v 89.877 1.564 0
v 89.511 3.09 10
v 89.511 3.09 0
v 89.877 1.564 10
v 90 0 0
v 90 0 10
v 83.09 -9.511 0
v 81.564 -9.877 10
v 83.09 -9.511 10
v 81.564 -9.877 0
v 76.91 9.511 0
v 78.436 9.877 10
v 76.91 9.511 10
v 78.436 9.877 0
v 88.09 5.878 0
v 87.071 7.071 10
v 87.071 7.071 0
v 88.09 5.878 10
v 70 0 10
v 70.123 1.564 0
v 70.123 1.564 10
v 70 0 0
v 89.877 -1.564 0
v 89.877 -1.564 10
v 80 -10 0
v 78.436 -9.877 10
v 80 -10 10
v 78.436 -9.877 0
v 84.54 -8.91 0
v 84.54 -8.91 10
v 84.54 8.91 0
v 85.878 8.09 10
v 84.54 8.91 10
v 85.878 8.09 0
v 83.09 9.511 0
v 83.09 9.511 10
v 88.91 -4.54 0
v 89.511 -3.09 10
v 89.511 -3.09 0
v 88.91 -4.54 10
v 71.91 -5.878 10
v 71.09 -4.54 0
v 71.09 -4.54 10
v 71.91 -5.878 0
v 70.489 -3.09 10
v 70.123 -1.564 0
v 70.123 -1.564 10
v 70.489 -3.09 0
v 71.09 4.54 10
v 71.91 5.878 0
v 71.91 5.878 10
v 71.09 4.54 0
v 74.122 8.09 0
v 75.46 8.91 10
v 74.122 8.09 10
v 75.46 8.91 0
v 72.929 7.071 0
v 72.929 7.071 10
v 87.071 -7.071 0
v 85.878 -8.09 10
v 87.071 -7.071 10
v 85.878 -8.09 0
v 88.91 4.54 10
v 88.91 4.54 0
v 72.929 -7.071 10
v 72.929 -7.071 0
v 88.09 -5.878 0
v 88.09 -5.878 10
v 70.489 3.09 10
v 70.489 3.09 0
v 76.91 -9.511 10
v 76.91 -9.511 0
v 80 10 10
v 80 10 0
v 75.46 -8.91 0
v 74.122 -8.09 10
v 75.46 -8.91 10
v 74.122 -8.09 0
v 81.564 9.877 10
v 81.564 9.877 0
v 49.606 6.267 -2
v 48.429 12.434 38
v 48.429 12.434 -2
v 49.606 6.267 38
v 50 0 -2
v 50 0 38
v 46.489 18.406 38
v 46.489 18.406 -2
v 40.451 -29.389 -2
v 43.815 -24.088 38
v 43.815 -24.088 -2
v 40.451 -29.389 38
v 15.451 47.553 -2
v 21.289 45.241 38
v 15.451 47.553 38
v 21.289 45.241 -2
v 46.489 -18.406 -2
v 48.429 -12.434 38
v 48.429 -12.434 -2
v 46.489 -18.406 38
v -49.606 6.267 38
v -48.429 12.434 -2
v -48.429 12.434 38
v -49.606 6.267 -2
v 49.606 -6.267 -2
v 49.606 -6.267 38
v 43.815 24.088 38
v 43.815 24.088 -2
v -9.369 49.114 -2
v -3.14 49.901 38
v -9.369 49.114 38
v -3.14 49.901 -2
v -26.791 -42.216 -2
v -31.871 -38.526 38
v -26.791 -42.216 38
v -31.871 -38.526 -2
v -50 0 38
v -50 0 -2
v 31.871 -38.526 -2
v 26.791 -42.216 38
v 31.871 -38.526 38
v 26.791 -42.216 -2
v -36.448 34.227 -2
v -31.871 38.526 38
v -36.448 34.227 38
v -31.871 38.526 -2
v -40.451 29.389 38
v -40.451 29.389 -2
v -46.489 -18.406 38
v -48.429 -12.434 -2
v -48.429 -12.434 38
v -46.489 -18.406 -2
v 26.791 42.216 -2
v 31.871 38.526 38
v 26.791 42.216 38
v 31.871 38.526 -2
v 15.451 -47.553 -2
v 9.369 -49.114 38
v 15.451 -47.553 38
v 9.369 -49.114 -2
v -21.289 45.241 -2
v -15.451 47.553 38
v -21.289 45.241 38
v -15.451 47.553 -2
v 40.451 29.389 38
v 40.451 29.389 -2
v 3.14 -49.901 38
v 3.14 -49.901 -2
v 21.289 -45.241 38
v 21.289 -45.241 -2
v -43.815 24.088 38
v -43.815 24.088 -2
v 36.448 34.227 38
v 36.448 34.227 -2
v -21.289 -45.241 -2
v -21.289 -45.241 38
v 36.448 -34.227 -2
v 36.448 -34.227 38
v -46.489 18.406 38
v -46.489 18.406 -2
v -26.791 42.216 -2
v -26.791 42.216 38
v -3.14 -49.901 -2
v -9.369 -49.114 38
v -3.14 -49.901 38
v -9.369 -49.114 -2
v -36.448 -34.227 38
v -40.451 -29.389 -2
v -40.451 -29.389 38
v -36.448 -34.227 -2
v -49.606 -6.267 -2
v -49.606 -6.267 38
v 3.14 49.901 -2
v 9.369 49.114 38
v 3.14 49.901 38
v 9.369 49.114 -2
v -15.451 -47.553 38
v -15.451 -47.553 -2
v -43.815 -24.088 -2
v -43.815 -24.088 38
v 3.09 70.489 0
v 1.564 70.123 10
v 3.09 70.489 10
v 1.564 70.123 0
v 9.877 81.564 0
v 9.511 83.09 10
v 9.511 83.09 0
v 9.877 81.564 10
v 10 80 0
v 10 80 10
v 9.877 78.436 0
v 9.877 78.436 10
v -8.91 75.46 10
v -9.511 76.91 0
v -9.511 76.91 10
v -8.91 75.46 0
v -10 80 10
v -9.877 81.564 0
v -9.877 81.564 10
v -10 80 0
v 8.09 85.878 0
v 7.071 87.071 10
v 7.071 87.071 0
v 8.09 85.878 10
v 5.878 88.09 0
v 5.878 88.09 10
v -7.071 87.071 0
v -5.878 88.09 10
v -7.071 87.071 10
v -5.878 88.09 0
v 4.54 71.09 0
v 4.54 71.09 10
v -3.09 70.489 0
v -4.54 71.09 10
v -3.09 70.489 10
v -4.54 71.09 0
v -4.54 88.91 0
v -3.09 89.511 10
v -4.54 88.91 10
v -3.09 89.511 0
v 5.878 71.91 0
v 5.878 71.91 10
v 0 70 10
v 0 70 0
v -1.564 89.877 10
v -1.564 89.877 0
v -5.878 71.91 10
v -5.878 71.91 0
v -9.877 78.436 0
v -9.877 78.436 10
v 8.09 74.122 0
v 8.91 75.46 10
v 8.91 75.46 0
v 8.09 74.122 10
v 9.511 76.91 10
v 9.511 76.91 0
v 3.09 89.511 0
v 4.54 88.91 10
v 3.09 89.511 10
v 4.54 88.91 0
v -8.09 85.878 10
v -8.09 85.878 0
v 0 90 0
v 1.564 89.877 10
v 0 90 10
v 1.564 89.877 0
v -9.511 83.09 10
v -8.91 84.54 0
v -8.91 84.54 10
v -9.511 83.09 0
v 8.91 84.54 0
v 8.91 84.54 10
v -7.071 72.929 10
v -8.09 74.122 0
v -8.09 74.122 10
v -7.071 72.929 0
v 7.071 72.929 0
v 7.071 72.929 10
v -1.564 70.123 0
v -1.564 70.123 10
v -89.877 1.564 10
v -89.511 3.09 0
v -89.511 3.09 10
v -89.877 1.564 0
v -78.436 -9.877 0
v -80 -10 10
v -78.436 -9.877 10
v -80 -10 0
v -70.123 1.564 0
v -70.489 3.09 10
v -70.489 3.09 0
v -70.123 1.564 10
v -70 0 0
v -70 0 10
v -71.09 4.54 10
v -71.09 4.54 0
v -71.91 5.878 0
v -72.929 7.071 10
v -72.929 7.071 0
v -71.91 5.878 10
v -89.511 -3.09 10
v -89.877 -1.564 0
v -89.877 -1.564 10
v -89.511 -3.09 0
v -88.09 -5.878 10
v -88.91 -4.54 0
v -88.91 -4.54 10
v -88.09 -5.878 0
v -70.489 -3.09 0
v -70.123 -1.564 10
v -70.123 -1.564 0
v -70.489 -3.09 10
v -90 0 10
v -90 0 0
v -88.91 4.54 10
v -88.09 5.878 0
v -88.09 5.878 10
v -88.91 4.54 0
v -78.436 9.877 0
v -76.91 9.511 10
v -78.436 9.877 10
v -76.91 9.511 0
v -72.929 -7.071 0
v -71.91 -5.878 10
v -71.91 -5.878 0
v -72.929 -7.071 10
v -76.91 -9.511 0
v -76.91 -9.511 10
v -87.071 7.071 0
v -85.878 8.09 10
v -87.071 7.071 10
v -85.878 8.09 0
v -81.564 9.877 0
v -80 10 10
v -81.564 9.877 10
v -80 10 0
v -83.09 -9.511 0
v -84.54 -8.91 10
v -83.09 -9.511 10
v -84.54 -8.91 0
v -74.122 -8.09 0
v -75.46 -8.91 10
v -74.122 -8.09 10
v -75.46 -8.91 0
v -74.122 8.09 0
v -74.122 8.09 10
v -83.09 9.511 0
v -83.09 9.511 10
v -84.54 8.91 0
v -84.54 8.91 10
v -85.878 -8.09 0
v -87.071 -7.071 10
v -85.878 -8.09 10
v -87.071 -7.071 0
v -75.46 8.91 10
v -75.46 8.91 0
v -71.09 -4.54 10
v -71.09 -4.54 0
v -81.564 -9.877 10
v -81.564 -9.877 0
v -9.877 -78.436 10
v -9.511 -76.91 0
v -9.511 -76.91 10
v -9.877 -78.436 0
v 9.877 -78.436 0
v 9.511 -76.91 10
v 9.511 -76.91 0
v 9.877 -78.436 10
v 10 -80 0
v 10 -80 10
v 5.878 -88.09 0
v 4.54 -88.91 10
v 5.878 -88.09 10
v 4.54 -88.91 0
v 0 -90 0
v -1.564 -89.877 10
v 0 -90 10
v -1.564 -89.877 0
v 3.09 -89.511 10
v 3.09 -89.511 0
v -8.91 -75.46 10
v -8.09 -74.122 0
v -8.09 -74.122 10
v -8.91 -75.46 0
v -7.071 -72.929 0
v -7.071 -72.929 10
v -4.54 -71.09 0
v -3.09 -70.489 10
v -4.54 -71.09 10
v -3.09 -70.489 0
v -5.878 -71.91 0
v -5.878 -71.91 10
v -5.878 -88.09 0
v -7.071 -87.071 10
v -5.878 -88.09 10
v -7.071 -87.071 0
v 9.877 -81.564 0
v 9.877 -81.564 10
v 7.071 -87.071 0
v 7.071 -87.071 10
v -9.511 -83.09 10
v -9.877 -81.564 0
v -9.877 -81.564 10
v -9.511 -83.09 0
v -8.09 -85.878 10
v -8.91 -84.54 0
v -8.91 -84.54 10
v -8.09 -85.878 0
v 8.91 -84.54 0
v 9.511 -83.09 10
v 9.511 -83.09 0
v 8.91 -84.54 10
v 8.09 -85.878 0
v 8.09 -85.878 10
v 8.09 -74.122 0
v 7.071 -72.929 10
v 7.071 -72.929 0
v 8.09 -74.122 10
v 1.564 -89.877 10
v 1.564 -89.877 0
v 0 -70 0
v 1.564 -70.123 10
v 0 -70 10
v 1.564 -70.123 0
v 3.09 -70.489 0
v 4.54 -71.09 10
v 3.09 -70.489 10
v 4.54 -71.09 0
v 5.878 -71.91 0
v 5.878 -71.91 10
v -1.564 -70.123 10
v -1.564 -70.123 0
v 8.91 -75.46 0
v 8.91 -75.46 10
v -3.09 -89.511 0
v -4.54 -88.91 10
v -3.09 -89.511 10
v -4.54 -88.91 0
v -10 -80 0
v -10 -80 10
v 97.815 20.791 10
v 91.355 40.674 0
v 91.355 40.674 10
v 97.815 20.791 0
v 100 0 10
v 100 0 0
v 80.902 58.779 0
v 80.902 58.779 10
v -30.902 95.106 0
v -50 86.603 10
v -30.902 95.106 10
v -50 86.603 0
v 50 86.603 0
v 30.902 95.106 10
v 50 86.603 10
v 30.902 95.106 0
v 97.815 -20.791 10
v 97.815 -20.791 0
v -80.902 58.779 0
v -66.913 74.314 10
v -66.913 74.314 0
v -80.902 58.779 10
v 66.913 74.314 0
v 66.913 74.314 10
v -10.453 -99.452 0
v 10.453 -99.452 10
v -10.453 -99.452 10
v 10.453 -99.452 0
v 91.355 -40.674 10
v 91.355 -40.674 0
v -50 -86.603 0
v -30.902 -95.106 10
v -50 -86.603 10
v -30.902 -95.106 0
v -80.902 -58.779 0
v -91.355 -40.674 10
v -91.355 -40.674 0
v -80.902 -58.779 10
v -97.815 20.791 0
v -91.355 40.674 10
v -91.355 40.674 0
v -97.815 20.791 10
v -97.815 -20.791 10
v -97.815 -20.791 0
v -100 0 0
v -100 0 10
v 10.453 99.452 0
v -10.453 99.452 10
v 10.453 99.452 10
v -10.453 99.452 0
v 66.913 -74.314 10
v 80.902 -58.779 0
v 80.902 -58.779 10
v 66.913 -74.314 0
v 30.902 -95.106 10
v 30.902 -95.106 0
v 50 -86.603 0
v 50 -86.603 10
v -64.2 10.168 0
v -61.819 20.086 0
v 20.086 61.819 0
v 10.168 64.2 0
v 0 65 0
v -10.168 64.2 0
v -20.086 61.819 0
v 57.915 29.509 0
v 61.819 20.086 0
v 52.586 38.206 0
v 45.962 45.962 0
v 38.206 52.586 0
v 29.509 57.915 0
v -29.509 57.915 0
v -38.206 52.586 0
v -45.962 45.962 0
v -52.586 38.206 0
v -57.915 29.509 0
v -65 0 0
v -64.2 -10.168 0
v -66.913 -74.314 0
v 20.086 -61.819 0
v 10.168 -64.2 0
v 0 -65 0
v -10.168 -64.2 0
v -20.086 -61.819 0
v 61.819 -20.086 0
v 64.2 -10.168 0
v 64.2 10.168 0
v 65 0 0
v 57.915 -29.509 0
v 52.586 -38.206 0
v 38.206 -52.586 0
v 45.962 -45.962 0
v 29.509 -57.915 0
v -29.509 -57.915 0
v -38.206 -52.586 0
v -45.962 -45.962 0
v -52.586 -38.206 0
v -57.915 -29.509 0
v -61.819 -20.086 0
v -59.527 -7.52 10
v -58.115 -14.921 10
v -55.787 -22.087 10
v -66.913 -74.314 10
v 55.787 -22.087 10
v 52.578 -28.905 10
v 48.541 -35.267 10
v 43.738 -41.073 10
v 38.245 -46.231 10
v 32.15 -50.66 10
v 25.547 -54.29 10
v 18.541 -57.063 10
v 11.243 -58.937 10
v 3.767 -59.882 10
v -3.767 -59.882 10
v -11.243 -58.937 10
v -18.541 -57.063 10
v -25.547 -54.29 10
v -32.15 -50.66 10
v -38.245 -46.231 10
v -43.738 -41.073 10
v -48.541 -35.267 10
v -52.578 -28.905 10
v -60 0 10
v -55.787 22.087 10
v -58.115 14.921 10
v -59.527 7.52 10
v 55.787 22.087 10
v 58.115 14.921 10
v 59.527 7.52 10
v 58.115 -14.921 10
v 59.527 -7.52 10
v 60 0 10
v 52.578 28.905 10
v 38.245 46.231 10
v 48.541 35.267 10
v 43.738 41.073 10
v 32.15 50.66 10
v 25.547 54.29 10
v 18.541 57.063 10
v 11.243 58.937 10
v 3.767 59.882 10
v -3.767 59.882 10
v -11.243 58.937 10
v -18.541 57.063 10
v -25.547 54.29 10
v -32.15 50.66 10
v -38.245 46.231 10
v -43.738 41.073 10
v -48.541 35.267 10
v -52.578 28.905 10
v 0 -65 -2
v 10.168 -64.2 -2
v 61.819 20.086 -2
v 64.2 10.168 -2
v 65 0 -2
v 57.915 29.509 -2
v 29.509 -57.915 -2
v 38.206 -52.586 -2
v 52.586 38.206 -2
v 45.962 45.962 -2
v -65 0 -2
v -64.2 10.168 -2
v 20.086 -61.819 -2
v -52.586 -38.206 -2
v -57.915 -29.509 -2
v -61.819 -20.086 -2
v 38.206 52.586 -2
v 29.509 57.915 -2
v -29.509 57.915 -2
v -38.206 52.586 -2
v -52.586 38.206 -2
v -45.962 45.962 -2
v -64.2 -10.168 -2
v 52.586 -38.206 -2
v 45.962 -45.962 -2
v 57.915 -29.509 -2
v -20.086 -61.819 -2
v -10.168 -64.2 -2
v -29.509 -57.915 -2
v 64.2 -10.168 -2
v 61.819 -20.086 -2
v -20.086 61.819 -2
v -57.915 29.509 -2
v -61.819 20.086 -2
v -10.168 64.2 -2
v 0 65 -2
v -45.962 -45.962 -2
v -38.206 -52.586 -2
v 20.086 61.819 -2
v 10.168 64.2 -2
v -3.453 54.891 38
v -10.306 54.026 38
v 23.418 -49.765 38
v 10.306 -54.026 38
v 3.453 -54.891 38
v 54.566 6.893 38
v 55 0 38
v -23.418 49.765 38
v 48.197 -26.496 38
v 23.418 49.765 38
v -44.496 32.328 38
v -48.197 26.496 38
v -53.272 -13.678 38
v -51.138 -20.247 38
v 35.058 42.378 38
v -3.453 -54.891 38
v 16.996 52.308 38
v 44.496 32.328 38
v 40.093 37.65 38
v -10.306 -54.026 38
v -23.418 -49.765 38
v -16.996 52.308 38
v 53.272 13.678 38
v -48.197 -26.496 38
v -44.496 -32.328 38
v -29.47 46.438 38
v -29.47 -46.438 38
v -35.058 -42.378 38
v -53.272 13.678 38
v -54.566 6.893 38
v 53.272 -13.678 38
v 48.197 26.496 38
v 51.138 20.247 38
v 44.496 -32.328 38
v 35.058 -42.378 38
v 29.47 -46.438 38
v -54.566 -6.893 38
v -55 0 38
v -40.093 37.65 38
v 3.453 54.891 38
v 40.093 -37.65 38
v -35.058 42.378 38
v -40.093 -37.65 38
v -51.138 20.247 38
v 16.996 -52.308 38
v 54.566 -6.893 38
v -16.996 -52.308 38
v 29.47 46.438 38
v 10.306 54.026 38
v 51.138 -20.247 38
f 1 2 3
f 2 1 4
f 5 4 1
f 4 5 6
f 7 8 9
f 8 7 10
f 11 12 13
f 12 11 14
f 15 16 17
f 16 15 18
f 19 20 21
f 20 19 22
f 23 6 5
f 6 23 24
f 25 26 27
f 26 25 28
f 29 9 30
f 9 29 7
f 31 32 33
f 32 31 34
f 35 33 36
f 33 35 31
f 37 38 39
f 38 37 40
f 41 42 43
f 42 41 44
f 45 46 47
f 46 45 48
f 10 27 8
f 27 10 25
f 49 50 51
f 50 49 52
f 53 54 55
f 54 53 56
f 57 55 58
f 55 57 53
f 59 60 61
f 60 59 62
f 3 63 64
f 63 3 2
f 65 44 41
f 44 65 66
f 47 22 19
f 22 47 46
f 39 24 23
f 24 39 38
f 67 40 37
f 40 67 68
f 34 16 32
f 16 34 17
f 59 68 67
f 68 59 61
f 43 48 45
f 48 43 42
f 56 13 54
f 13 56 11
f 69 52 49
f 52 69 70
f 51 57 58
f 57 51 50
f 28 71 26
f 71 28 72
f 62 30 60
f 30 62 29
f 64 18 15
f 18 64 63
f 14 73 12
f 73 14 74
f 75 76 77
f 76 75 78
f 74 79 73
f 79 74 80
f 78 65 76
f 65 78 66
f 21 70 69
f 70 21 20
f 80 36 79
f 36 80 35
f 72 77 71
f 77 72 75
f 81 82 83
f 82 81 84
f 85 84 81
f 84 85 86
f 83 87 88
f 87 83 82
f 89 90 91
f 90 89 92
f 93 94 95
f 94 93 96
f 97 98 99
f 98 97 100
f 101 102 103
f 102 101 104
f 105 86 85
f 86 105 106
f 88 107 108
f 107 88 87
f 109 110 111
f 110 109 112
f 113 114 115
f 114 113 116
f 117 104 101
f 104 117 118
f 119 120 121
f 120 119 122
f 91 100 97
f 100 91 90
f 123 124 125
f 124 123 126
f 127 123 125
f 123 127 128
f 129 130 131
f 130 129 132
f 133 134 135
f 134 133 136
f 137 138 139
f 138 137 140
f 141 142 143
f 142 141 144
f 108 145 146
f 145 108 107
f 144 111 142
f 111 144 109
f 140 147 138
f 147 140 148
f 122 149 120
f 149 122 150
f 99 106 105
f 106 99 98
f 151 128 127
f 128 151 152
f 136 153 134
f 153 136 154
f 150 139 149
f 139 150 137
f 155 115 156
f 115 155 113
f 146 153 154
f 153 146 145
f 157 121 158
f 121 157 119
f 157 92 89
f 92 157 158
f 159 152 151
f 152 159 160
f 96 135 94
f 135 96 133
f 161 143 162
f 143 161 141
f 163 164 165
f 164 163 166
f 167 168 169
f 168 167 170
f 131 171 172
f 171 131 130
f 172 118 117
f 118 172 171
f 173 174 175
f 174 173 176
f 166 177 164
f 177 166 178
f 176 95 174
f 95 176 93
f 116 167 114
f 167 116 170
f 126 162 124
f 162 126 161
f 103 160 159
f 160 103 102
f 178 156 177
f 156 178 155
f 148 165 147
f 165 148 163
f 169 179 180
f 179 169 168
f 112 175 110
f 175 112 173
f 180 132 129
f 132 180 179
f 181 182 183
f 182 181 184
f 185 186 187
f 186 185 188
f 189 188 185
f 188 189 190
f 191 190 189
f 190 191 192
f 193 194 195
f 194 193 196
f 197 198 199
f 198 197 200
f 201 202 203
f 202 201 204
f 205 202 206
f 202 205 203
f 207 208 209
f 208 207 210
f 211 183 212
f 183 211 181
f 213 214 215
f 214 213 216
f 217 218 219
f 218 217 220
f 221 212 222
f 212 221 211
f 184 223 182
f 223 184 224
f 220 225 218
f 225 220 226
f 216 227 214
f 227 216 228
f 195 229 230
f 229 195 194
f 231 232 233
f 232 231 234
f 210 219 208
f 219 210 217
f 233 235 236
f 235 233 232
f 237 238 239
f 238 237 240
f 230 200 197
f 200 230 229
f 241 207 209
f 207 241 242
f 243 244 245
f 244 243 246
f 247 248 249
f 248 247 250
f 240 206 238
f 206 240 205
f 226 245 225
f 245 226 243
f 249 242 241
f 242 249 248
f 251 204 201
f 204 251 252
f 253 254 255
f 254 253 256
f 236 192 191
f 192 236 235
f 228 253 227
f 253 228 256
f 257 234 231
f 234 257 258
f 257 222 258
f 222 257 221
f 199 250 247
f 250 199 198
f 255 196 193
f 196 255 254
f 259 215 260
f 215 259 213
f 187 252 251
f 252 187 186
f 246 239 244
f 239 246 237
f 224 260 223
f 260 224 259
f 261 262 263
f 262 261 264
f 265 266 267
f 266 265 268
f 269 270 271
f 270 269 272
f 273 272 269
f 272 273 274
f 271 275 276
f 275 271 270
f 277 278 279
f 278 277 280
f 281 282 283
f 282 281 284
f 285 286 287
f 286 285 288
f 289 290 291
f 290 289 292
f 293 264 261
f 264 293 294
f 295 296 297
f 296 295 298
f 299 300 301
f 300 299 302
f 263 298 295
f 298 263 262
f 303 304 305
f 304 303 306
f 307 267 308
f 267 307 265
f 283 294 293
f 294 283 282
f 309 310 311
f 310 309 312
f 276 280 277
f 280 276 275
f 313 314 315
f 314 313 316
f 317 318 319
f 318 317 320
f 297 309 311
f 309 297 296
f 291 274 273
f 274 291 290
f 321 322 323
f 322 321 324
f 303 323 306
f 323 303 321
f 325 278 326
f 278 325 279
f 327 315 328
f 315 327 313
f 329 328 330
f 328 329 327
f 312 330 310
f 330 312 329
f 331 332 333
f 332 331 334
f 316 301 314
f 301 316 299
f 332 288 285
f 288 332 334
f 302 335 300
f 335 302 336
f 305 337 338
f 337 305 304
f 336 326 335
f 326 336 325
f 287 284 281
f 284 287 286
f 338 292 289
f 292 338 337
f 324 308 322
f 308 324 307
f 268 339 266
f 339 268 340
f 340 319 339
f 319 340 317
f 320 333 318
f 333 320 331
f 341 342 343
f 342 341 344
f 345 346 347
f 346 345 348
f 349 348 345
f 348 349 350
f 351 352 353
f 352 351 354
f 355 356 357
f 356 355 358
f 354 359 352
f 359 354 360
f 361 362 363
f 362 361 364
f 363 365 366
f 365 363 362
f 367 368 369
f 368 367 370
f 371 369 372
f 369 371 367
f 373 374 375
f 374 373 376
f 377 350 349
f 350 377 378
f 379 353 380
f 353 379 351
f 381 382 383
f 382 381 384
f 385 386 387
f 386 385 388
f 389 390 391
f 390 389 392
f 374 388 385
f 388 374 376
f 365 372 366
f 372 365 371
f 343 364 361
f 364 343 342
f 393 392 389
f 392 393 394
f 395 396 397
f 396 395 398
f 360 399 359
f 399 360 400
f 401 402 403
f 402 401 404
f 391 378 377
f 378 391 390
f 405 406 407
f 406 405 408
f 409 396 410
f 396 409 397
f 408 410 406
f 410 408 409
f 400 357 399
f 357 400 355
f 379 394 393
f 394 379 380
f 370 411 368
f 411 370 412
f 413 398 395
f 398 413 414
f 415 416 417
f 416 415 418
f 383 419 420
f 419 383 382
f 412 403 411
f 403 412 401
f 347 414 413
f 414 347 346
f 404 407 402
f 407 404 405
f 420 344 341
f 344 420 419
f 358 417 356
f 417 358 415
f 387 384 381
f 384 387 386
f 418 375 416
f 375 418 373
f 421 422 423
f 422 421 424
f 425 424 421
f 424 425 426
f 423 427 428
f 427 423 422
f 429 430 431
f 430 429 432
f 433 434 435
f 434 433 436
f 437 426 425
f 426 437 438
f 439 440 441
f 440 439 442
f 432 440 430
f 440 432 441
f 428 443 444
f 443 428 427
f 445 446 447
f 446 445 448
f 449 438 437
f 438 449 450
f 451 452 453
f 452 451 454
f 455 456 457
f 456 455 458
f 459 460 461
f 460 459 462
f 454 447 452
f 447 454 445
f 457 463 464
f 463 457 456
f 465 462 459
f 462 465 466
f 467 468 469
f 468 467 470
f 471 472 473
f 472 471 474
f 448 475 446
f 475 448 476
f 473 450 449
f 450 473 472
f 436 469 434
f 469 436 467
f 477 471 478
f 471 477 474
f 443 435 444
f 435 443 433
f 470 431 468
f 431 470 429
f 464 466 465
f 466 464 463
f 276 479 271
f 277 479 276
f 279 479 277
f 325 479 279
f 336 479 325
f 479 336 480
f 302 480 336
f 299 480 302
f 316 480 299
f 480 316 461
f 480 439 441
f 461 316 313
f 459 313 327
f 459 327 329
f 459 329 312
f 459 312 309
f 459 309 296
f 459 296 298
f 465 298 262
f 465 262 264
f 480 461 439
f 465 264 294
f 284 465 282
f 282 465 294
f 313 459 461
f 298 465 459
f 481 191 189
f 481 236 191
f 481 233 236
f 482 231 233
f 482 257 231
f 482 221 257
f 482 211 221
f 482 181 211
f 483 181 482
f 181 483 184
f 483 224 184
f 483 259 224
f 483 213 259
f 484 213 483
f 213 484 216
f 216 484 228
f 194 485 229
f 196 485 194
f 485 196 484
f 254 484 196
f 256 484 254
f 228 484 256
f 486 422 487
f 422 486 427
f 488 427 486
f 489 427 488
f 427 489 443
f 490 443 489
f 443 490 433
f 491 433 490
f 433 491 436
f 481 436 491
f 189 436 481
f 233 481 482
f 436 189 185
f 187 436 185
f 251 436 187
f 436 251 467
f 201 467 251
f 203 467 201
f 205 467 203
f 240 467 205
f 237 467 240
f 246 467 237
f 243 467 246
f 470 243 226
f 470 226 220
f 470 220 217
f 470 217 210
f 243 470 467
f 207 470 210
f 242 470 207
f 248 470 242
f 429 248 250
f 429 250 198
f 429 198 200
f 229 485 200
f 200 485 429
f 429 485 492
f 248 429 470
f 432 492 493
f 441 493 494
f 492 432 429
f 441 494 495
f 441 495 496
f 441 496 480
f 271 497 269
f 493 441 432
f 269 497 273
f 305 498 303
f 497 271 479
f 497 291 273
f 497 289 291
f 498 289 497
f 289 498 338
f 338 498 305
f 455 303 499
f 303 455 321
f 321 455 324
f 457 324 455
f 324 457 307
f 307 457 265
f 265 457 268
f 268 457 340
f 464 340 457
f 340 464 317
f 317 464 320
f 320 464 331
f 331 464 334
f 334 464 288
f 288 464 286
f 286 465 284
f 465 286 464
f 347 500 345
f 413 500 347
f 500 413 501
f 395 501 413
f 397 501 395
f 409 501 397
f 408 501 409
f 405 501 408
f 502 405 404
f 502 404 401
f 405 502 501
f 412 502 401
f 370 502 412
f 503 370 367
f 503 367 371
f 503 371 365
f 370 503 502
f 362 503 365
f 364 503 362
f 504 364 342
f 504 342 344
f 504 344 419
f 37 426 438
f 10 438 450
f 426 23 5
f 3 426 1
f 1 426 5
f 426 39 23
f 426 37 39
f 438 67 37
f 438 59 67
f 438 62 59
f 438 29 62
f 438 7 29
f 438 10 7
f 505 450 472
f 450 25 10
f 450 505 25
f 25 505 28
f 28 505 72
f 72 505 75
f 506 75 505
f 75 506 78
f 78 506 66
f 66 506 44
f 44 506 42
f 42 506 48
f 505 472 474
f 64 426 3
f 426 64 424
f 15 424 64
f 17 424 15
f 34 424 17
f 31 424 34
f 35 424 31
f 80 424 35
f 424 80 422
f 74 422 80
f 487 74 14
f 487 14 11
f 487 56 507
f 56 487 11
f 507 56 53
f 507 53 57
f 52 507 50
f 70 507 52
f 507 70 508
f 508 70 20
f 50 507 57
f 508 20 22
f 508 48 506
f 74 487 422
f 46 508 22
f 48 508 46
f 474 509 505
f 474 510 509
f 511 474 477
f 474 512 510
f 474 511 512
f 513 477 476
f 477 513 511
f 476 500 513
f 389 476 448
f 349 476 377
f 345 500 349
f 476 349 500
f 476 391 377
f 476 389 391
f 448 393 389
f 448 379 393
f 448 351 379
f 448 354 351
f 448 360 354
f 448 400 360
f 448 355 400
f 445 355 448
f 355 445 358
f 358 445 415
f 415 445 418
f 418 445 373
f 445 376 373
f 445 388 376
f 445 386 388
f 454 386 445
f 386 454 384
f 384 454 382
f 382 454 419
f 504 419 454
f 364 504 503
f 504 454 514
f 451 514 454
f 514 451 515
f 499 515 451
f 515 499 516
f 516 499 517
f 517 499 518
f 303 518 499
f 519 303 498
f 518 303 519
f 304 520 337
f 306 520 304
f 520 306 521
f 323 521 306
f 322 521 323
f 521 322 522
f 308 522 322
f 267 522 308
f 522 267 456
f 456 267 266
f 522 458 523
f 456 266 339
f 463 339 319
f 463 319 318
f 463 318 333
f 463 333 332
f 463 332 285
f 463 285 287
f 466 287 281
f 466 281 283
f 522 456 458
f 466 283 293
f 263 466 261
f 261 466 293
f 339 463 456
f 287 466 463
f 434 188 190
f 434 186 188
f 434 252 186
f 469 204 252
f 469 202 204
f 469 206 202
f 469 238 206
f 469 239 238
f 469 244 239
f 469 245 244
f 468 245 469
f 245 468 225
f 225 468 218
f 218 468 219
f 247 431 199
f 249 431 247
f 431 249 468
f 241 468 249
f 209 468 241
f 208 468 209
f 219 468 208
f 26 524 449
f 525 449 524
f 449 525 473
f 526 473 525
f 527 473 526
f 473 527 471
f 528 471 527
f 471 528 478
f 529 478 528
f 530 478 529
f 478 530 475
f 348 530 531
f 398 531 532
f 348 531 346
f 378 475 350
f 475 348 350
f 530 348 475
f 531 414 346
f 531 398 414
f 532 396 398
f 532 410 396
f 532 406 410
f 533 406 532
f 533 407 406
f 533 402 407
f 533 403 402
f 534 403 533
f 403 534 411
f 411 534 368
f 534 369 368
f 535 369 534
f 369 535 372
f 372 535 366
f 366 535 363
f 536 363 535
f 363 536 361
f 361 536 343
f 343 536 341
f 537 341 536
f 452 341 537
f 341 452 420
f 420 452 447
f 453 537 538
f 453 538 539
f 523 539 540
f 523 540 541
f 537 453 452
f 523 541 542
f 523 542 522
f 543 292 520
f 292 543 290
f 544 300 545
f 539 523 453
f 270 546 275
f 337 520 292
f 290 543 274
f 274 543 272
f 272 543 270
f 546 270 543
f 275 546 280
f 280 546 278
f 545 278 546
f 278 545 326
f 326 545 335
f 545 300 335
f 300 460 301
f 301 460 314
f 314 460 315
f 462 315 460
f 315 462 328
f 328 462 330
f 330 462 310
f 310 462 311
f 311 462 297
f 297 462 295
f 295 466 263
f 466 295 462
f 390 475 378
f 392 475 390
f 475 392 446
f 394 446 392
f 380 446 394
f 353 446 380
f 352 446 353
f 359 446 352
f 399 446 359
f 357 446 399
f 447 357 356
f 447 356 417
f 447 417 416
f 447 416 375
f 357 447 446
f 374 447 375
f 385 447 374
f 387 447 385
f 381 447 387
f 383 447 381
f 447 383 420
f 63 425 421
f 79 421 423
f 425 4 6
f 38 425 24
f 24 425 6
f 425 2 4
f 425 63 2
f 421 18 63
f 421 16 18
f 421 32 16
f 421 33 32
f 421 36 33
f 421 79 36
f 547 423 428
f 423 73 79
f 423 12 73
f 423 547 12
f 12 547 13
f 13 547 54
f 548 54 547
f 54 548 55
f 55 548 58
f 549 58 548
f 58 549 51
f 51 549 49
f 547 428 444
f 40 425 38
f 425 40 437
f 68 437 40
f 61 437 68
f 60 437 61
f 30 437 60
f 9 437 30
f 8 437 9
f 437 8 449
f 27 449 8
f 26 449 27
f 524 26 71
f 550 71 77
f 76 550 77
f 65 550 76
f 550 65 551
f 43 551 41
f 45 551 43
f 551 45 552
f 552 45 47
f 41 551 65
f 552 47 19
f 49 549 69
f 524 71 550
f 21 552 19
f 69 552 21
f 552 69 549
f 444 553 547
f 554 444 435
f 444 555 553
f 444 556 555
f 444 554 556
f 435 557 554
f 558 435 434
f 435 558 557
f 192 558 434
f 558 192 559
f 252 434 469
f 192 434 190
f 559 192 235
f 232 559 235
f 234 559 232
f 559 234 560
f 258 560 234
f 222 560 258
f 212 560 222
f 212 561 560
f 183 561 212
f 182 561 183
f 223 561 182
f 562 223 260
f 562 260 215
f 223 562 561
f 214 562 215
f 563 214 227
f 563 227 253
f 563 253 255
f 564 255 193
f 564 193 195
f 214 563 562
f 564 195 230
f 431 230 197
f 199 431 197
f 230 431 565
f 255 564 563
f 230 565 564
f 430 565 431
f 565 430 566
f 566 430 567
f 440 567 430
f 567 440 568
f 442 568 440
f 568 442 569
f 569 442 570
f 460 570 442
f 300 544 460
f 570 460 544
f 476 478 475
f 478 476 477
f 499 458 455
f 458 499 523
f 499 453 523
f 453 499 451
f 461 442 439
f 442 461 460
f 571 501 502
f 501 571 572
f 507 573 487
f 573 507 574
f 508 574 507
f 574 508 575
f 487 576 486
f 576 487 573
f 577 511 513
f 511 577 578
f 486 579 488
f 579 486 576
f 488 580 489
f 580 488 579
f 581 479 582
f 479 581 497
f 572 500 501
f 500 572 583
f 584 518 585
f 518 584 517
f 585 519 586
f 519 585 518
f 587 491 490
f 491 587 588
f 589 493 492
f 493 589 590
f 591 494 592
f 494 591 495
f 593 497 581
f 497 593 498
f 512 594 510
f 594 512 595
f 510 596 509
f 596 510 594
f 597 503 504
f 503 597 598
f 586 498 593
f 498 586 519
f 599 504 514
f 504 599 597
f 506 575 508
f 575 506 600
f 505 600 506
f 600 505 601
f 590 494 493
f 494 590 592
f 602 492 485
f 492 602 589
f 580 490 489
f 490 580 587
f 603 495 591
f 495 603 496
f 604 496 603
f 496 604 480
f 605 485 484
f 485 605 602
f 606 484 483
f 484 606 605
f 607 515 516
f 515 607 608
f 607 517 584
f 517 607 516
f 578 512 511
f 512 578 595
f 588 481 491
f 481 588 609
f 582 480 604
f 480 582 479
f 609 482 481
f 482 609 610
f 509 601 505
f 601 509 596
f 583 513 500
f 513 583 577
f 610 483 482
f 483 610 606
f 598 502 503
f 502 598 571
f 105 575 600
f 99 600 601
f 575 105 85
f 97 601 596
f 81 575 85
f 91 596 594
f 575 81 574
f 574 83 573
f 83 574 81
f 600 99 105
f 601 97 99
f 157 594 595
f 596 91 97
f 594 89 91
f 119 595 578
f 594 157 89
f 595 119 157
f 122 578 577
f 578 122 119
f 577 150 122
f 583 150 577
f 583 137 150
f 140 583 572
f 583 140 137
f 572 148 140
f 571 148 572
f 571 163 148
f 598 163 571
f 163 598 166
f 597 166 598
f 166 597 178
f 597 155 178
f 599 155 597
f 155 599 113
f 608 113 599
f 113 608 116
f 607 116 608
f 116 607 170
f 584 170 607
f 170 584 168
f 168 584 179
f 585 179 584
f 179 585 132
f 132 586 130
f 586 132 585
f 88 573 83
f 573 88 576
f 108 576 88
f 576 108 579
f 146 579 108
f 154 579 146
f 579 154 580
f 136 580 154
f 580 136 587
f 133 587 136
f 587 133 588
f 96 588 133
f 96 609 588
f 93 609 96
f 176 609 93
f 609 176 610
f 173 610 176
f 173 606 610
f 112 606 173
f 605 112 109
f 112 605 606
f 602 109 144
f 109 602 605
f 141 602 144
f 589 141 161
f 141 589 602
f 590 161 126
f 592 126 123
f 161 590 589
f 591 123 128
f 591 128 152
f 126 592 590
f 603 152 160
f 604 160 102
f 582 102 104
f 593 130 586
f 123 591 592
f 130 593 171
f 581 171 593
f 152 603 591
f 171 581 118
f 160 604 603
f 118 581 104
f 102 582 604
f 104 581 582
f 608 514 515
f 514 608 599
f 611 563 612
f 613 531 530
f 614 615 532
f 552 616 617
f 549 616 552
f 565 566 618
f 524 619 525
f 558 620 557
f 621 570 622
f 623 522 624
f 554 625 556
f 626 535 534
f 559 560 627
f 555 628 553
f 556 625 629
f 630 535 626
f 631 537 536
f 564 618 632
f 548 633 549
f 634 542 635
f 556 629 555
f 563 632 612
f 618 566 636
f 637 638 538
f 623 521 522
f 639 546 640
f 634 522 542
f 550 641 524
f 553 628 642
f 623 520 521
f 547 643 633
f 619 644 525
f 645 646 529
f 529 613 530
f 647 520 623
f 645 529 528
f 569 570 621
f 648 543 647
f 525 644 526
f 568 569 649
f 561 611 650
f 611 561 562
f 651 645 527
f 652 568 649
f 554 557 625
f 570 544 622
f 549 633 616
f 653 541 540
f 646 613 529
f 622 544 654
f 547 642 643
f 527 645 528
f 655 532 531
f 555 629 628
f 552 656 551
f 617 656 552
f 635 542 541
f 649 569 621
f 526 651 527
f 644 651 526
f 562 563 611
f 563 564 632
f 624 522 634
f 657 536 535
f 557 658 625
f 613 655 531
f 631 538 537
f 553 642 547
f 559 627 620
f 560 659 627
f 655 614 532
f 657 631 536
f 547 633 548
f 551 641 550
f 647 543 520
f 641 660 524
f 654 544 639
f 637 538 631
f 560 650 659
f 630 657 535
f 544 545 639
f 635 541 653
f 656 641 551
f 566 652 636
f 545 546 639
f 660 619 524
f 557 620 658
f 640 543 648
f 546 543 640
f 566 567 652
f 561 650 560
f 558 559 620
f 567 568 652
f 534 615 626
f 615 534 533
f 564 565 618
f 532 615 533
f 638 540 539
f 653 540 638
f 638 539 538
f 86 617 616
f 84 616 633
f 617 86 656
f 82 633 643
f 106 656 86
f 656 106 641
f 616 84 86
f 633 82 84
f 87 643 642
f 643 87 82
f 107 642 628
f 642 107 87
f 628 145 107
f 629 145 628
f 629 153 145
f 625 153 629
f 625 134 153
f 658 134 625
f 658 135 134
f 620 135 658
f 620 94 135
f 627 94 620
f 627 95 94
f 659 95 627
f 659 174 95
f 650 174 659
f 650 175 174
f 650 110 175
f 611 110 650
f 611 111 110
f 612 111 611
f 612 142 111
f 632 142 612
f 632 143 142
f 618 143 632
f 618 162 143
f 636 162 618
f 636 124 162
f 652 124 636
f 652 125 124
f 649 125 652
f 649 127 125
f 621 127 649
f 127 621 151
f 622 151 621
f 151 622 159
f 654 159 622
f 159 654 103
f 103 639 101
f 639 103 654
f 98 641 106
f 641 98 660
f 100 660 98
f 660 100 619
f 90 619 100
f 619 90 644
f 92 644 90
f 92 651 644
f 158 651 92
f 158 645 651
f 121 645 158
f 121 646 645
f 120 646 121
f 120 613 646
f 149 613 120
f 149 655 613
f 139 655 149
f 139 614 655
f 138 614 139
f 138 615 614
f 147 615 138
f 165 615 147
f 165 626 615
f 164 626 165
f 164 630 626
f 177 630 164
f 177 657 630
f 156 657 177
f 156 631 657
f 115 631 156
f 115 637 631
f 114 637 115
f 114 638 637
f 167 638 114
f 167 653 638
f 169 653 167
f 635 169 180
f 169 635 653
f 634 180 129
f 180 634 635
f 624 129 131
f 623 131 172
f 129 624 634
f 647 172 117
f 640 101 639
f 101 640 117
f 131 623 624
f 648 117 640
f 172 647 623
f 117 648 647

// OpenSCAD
Flange_Height = 10;
Total_Height = 38;
Step_Height = 2;

color("lime",1.0){
    difference(){

        union(){
            translate([0,0,- Step_Height]){ 
            cylinder(Step_Height,65,65,$fn=40);
            }

            difference(){
            cylinder(Flange_Height,100,100,$fn=30);
            
            r = 80;
            // Flange Holes
            for (i=[0:90:359]) {
                translate([r*cos(i),r*sin(i),-1])
                cylinder(12,10,10,$fn=40);
             
                translate([0,0,-1]) 
                cylinder(12,50,50,$fn=50);  
                }
            }
        translate([0,0,Flange_Height]) 
        cylinder(Total_Height - Flange_Height,60,55,$fn=50);    
        }
     
       
        translate([0,0,-10]) 
        cylinder(100,50,50,$fn=50);
    }
}
